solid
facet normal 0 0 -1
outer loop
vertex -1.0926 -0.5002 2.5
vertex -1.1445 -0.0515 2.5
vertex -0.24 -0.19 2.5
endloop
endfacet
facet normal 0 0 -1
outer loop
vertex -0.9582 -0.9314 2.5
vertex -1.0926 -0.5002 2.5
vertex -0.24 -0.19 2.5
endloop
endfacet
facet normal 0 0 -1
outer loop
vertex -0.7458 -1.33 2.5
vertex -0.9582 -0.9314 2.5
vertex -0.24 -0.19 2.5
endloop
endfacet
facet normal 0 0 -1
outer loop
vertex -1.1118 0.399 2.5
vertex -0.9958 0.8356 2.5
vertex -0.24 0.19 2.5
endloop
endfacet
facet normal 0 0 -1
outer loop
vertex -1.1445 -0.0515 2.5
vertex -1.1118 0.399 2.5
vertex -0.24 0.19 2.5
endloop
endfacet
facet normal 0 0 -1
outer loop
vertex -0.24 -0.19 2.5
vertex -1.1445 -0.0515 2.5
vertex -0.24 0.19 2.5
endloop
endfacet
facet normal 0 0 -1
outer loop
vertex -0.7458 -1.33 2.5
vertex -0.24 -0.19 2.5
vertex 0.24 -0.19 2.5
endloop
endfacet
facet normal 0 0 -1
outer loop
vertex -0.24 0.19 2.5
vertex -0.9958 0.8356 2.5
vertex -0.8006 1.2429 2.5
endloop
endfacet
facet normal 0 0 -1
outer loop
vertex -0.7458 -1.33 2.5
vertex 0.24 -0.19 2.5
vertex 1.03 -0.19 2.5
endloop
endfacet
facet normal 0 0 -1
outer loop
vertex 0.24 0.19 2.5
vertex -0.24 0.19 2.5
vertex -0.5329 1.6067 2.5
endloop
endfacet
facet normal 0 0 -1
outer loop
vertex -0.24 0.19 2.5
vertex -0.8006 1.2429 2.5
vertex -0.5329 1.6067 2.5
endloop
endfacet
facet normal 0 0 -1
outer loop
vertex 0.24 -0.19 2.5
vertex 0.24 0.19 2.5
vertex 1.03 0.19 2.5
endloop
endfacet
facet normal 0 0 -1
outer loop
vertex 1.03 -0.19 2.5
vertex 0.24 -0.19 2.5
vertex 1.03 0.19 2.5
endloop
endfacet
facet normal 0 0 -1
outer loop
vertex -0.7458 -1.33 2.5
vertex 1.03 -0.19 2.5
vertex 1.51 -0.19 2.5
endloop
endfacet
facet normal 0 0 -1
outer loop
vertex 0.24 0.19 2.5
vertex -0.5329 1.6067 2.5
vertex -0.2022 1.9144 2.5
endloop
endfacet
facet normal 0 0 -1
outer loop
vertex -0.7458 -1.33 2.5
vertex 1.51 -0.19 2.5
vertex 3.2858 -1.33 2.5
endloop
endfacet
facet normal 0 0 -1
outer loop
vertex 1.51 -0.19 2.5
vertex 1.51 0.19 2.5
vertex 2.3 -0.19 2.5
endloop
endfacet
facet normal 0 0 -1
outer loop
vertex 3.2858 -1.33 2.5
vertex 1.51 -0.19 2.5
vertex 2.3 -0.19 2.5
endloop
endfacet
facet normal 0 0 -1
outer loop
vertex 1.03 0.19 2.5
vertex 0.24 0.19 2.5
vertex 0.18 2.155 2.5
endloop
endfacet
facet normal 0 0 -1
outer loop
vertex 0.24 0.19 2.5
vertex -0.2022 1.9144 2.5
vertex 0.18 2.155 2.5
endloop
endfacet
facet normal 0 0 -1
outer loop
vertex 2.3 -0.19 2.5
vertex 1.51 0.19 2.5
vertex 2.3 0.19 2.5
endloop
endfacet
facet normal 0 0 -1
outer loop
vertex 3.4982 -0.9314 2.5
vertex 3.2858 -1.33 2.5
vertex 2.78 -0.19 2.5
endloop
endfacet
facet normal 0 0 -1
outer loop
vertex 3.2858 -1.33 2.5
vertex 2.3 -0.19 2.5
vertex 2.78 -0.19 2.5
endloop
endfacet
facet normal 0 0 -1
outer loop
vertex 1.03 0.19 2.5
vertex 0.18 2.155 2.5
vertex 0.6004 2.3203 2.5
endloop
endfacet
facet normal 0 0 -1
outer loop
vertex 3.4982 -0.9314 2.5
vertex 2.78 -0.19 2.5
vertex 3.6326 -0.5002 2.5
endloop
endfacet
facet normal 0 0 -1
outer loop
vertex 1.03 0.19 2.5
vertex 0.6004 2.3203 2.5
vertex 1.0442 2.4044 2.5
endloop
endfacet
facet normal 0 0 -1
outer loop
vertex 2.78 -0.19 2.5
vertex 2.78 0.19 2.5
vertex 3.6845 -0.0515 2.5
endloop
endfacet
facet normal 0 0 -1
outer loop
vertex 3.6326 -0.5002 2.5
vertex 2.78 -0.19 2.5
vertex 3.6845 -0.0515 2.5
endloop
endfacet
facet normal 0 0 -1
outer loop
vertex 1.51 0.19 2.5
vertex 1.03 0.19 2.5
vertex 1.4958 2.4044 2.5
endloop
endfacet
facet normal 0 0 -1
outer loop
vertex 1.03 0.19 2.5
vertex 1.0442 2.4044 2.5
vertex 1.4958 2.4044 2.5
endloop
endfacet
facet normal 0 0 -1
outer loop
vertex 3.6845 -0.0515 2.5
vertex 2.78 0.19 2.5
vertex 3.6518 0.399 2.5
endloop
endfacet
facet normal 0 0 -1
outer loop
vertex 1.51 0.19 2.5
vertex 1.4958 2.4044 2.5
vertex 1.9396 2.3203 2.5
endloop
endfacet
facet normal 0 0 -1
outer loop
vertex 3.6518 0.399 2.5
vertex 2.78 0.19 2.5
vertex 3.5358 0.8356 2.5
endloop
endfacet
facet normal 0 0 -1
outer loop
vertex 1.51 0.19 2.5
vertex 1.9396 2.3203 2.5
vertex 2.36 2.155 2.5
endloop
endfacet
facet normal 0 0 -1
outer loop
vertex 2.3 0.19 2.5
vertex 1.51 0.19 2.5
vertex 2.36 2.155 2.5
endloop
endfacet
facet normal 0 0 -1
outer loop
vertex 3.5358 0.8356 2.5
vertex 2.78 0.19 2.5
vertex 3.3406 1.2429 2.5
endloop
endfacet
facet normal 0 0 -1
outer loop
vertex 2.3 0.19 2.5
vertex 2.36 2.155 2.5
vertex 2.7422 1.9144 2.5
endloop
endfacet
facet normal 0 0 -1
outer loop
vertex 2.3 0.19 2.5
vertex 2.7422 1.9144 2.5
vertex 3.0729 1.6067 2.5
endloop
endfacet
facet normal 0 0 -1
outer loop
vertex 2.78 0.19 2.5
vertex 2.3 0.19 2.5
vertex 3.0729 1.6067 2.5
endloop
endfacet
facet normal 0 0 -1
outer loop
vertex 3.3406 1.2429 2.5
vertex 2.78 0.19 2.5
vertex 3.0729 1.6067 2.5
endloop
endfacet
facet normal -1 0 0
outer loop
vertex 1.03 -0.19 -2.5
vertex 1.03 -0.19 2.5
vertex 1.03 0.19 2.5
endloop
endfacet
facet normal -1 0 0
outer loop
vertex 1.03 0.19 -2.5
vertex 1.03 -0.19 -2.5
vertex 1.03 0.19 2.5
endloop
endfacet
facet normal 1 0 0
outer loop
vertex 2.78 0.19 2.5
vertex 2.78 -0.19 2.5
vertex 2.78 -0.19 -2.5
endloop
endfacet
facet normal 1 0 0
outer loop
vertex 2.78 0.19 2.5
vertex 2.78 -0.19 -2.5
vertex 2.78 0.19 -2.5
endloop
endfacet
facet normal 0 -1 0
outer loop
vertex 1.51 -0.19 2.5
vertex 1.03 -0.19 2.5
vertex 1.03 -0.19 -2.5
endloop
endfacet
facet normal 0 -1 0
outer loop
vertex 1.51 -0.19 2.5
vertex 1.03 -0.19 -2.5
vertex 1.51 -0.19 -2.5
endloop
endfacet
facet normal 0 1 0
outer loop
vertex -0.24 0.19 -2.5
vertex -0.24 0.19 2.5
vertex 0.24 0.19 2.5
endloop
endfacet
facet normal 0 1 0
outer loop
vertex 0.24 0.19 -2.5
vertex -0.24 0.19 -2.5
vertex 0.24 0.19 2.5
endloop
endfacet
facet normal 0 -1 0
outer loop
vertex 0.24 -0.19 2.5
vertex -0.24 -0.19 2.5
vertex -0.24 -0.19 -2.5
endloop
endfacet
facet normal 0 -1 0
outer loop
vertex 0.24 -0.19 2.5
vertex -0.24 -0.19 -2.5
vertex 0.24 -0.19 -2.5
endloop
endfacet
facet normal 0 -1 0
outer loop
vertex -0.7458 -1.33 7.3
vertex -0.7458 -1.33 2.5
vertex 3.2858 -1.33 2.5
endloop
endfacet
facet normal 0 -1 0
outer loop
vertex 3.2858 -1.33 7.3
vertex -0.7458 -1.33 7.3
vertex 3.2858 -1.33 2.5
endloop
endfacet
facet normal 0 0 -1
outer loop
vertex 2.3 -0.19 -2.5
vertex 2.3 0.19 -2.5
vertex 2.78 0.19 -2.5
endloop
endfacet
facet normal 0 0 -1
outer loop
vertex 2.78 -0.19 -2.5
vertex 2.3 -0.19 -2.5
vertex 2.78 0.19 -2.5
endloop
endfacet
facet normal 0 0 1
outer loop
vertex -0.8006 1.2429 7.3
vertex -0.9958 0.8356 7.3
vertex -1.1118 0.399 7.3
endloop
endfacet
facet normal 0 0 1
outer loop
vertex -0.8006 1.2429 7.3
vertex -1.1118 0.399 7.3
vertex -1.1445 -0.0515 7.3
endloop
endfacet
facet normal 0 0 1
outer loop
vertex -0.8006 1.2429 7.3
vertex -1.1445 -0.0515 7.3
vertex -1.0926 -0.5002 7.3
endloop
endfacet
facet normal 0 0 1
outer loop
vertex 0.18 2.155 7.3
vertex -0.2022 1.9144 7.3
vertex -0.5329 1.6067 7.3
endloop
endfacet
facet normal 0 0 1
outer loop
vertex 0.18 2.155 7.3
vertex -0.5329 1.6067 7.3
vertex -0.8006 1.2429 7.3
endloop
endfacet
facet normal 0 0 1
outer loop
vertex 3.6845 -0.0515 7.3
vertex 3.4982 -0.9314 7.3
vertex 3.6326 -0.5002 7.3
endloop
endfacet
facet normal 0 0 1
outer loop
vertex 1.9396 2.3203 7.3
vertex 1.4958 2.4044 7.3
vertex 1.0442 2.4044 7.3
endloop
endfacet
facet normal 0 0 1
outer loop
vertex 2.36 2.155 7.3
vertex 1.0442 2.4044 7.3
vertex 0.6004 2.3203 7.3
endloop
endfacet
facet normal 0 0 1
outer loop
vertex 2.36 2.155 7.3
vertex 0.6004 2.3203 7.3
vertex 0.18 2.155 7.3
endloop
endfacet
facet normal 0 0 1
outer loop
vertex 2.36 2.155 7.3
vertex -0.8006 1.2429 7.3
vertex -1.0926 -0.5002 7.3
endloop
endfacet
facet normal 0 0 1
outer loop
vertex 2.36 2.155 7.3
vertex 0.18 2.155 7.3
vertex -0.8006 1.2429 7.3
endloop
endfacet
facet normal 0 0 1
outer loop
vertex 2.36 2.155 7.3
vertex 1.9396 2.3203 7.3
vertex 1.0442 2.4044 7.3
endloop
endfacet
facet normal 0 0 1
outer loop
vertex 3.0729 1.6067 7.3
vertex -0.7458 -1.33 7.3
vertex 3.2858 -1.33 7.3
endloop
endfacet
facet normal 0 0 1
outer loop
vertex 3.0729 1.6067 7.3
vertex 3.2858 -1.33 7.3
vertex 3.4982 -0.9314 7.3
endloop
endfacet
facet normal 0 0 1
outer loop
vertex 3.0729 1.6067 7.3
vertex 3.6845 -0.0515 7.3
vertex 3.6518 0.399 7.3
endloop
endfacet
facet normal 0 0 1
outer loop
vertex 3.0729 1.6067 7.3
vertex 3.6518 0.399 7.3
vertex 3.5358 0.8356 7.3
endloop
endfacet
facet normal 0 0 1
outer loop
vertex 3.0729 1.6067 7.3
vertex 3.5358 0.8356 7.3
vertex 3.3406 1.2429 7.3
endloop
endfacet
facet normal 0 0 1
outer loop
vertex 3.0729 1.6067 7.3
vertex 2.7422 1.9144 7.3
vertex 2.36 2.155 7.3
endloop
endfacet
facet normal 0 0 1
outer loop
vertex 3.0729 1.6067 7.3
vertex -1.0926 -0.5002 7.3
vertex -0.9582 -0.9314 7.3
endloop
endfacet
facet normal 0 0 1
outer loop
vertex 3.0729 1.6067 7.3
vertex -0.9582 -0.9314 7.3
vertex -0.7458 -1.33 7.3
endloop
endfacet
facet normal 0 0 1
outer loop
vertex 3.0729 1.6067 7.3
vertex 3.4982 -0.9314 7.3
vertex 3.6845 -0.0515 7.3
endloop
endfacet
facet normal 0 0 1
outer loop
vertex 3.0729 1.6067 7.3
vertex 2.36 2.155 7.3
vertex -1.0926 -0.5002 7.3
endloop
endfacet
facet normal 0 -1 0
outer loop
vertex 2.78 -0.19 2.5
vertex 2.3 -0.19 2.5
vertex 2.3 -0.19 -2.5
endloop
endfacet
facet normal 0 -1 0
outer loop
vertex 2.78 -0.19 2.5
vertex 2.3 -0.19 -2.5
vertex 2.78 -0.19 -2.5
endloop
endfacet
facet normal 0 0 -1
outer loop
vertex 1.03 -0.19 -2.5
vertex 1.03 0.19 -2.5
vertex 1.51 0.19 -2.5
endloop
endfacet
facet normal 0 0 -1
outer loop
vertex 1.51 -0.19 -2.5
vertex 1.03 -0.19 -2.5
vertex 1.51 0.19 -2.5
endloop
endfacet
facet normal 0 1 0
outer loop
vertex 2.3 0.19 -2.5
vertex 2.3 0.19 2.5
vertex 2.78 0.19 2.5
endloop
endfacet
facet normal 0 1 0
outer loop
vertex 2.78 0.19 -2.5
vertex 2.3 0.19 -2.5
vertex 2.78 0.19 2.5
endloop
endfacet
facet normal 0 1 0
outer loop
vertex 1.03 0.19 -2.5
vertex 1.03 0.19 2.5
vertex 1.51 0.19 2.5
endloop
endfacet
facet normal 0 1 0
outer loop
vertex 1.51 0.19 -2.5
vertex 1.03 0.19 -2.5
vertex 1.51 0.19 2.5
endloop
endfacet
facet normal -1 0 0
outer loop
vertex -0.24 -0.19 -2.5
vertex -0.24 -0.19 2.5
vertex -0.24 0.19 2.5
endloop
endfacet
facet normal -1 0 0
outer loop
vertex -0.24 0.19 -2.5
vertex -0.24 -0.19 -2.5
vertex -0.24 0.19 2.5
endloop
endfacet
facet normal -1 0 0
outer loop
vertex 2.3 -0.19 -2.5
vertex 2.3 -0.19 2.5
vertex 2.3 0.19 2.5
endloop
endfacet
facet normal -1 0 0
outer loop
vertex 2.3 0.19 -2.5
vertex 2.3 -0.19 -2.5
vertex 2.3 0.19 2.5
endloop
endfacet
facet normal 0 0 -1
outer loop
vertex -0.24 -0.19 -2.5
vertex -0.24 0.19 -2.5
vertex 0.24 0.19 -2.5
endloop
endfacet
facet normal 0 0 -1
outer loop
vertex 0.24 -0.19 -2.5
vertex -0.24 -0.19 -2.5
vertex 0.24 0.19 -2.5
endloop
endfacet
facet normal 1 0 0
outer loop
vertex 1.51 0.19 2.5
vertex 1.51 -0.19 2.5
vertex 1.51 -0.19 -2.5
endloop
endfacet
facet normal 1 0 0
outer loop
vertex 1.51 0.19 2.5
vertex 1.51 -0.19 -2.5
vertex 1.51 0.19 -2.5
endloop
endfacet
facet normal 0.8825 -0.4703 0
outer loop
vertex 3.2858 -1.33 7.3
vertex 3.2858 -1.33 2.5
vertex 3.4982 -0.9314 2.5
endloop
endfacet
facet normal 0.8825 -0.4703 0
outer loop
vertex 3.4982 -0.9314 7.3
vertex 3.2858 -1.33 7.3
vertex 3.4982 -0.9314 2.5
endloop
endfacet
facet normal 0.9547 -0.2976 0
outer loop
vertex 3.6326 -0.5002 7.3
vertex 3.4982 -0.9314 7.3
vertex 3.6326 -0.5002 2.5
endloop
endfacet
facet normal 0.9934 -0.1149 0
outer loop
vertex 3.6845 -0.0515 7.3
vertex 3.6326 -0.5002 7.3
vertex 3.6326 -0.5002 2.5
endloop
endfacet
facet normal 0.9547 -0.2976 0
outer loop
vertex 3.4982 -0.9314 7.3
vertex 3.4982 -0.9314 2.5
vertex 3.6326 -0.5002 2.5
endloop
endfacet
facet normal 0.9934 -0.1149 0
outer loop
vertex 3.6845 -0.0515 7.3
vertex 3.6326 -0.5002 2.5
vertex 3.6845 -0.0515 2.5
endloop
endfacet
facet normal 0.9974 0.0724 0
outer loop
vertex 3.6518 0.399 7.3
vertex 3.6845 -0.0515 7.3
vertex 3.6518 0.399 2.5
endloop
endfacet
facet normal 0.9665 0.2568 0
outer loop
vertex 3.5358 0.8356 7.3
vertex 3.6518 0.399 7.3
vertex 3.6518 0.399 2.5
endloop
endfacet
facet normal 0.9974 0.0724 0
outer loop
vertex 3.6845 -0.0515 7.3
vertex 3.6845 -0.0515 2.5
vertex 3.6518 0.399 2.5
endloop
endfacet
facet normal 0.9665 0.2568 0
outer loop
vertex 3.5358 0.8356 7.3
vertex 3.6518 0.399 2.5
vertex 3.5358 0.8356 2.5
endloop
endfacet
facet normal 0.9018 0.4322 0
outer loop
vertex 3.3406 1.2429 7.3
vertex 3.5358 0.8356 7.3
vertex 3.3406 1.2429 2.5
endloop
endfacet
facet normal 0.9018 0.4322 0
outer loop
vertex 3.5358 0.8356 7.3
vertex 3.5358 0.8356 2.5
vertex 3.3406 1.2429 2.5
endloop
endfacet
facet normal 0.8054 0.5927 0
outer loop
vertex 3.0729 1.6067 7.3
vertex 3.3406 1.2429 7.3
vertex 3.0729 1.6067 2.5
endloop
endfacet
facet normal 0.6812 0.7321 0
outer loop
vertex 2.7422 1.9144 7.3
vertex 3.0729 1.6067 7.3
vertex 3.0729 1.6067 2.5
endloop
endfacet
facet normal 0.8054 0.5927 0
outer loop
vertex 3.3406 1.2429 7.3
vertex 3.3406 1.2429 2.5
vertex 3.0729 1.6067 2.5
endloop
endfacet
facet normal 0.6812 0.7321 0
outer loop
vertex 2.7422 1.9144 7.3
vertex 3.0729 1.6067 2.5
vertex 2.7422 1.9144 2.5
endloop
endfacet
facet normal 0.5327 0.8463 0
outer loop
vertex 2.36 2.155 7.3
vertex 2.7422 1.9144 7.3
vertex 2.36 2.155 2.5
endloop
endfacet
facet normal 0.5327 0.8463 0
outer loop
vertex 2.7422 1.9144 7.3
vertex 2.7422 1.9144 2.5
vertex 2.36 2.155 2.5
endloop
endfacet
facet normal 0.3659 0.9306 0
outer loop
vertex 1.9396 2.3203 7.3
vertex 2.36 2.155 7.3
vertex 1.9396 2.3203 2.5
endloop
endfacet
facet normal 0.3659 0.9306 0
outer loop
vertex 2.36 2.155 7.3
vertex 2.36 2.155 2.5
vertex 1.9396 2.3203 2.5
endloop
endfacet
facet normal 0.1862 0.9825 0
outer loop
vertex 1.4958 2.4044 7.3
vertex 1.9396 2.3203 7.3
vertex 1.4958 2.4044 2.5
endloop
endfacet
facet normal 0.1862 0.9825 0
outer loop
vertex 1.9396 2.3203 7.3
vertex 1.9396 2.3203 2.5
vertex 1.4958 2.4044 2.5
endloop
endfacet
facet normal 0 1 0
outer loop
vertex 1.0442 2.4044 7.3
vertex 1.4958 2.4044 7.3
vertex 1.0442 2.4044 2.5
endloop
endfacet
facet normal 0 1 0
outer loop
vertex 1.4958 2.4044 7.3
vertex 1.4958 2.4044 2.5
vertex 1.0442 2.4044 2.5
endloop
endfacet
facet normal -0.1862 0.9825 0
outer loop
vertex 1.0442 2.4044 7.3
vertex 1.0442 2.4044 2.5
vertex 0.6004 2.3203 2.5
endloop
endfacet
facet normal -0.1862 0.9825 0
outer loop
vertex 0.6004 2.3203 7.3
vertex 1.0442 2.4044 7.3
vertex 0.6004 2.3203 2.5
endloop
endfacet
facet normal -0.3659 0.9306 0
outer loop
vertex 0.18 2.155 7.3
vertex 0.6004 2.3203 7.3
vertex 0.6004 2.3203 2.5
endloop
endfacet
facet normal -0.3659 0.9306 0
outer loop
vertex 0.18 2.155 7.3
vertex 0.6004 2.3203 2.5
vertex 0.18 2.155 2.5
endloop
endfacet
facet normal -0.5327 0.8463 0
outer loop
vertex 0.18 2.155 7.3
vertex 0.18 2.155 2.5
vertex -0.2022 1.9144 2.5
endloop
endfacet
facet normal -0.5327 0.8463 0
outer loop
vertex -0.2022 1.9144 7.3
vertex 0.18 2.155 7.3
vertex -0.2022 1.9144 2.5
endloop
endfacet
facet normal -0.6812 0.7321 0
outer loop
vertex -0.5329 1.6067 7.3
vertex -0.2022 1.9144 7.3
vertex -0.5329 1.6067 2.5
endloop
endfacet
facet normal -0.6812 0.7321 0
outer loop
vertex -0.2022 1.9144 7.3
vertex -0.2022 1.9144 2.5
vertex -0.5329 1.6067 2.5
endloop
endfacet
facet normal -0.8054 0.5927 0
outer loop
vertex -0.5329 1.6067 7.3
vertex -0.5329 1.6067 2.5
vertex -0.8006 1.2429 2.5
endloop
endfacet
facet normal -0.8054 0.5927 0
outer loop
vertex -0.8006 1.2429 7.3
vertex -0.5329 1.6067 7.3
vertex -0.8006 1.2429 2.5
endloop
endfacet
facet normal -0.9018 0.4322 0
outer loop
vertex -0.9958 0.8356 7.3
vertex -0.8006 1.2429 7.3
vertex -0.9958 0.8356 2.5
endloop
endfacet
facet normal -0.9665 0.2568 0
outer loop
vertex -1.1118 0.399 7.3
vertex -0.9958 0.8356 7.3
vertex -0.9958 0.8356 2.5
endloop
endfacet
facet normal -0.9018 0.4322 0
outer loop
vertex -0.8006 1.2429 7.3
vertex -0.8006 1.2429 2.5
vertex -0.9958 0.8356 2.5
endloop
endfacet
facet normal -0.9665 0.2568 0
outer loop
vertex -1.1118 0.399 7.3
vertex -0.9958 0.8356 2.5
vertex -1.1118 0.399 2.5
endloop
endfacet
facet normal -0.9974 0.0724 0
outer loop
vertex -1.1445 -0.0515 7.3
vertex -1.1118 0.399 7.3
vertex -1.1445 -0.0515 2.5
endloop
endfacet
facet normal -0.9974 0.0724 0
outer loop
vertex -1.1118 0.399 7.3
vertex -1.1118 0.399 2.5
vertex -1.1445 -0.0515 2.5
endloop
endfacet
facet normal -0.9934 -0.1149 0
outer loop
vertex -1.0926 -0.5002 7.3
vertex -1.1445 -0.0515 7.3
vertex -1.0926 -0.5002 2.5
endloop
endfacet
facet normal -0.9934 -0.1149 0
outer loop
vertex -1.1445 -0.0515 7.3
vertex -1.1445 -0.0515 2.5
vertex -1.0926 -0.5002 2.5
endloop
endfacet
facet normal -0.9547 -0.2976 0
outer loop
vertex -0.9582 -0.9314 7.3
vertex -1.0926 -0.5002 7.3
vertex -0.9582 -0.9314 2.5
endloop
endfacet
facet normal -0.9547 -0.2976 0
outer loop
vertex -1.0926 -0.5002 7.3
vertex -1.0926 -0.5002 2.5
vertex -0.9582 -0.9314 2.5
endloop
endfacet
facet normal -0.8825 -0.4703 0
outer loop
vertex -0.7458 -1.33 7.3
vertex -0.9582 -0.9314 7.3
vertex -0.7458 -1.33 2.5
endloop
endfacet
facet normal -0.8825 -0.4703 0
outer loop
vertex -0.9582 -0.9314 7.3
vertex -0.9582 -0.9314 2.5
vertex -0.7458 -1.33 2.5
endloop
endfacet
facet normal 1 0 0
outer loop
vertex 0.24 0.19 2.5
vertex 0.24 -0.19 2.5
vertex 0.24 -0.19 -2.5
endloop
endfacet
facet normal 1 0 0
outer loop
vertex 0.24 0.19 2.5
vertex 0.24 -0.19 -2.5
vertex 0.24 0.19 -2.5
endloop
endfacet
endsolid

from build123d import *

# Parameters (mm, degrees)
SKETCH001_W  = 0.48
SKETCH001_H  = 0.38
PAD001_DEPTH = 5
PAD_DEPTH    = 4.8


with BuildPart() as pad001:
    # Sketch001 → Pad001 (new body)
    with BuildSketch(Plane.XY.offset(2.5)):
        Rectangle(SKETCH001_W, SKETCH001_H)
        with Locations((1.27, 0)):
            Rectangle(SKETCH001_W, SKETCH001_H)
        with Locations((2.54, 0)):
            Rectangle(SKETCH001_W, SKETCH001_H)
    extrude(amount=-PAD001_DEPTH)


with BuildPart() as to_92_inline_narrow:
    # Sketch → Pad (new body)
    with BuildSketch(Plane.XY.offset(2.5)):
        with BuildLine():
            Line((-0.745769, -1.33), (3.285769, -1.33))
            ThreePointArc((3.285769, -1.33), (1.27, 2.415), (-0.745769, -1.33))
        make_face()
    extrude(amount=PAD_DEPTH)

    # Pad_mp_cp: union Pad001
    add(pad001.part)


solid = to_92_inline_narrow.part
